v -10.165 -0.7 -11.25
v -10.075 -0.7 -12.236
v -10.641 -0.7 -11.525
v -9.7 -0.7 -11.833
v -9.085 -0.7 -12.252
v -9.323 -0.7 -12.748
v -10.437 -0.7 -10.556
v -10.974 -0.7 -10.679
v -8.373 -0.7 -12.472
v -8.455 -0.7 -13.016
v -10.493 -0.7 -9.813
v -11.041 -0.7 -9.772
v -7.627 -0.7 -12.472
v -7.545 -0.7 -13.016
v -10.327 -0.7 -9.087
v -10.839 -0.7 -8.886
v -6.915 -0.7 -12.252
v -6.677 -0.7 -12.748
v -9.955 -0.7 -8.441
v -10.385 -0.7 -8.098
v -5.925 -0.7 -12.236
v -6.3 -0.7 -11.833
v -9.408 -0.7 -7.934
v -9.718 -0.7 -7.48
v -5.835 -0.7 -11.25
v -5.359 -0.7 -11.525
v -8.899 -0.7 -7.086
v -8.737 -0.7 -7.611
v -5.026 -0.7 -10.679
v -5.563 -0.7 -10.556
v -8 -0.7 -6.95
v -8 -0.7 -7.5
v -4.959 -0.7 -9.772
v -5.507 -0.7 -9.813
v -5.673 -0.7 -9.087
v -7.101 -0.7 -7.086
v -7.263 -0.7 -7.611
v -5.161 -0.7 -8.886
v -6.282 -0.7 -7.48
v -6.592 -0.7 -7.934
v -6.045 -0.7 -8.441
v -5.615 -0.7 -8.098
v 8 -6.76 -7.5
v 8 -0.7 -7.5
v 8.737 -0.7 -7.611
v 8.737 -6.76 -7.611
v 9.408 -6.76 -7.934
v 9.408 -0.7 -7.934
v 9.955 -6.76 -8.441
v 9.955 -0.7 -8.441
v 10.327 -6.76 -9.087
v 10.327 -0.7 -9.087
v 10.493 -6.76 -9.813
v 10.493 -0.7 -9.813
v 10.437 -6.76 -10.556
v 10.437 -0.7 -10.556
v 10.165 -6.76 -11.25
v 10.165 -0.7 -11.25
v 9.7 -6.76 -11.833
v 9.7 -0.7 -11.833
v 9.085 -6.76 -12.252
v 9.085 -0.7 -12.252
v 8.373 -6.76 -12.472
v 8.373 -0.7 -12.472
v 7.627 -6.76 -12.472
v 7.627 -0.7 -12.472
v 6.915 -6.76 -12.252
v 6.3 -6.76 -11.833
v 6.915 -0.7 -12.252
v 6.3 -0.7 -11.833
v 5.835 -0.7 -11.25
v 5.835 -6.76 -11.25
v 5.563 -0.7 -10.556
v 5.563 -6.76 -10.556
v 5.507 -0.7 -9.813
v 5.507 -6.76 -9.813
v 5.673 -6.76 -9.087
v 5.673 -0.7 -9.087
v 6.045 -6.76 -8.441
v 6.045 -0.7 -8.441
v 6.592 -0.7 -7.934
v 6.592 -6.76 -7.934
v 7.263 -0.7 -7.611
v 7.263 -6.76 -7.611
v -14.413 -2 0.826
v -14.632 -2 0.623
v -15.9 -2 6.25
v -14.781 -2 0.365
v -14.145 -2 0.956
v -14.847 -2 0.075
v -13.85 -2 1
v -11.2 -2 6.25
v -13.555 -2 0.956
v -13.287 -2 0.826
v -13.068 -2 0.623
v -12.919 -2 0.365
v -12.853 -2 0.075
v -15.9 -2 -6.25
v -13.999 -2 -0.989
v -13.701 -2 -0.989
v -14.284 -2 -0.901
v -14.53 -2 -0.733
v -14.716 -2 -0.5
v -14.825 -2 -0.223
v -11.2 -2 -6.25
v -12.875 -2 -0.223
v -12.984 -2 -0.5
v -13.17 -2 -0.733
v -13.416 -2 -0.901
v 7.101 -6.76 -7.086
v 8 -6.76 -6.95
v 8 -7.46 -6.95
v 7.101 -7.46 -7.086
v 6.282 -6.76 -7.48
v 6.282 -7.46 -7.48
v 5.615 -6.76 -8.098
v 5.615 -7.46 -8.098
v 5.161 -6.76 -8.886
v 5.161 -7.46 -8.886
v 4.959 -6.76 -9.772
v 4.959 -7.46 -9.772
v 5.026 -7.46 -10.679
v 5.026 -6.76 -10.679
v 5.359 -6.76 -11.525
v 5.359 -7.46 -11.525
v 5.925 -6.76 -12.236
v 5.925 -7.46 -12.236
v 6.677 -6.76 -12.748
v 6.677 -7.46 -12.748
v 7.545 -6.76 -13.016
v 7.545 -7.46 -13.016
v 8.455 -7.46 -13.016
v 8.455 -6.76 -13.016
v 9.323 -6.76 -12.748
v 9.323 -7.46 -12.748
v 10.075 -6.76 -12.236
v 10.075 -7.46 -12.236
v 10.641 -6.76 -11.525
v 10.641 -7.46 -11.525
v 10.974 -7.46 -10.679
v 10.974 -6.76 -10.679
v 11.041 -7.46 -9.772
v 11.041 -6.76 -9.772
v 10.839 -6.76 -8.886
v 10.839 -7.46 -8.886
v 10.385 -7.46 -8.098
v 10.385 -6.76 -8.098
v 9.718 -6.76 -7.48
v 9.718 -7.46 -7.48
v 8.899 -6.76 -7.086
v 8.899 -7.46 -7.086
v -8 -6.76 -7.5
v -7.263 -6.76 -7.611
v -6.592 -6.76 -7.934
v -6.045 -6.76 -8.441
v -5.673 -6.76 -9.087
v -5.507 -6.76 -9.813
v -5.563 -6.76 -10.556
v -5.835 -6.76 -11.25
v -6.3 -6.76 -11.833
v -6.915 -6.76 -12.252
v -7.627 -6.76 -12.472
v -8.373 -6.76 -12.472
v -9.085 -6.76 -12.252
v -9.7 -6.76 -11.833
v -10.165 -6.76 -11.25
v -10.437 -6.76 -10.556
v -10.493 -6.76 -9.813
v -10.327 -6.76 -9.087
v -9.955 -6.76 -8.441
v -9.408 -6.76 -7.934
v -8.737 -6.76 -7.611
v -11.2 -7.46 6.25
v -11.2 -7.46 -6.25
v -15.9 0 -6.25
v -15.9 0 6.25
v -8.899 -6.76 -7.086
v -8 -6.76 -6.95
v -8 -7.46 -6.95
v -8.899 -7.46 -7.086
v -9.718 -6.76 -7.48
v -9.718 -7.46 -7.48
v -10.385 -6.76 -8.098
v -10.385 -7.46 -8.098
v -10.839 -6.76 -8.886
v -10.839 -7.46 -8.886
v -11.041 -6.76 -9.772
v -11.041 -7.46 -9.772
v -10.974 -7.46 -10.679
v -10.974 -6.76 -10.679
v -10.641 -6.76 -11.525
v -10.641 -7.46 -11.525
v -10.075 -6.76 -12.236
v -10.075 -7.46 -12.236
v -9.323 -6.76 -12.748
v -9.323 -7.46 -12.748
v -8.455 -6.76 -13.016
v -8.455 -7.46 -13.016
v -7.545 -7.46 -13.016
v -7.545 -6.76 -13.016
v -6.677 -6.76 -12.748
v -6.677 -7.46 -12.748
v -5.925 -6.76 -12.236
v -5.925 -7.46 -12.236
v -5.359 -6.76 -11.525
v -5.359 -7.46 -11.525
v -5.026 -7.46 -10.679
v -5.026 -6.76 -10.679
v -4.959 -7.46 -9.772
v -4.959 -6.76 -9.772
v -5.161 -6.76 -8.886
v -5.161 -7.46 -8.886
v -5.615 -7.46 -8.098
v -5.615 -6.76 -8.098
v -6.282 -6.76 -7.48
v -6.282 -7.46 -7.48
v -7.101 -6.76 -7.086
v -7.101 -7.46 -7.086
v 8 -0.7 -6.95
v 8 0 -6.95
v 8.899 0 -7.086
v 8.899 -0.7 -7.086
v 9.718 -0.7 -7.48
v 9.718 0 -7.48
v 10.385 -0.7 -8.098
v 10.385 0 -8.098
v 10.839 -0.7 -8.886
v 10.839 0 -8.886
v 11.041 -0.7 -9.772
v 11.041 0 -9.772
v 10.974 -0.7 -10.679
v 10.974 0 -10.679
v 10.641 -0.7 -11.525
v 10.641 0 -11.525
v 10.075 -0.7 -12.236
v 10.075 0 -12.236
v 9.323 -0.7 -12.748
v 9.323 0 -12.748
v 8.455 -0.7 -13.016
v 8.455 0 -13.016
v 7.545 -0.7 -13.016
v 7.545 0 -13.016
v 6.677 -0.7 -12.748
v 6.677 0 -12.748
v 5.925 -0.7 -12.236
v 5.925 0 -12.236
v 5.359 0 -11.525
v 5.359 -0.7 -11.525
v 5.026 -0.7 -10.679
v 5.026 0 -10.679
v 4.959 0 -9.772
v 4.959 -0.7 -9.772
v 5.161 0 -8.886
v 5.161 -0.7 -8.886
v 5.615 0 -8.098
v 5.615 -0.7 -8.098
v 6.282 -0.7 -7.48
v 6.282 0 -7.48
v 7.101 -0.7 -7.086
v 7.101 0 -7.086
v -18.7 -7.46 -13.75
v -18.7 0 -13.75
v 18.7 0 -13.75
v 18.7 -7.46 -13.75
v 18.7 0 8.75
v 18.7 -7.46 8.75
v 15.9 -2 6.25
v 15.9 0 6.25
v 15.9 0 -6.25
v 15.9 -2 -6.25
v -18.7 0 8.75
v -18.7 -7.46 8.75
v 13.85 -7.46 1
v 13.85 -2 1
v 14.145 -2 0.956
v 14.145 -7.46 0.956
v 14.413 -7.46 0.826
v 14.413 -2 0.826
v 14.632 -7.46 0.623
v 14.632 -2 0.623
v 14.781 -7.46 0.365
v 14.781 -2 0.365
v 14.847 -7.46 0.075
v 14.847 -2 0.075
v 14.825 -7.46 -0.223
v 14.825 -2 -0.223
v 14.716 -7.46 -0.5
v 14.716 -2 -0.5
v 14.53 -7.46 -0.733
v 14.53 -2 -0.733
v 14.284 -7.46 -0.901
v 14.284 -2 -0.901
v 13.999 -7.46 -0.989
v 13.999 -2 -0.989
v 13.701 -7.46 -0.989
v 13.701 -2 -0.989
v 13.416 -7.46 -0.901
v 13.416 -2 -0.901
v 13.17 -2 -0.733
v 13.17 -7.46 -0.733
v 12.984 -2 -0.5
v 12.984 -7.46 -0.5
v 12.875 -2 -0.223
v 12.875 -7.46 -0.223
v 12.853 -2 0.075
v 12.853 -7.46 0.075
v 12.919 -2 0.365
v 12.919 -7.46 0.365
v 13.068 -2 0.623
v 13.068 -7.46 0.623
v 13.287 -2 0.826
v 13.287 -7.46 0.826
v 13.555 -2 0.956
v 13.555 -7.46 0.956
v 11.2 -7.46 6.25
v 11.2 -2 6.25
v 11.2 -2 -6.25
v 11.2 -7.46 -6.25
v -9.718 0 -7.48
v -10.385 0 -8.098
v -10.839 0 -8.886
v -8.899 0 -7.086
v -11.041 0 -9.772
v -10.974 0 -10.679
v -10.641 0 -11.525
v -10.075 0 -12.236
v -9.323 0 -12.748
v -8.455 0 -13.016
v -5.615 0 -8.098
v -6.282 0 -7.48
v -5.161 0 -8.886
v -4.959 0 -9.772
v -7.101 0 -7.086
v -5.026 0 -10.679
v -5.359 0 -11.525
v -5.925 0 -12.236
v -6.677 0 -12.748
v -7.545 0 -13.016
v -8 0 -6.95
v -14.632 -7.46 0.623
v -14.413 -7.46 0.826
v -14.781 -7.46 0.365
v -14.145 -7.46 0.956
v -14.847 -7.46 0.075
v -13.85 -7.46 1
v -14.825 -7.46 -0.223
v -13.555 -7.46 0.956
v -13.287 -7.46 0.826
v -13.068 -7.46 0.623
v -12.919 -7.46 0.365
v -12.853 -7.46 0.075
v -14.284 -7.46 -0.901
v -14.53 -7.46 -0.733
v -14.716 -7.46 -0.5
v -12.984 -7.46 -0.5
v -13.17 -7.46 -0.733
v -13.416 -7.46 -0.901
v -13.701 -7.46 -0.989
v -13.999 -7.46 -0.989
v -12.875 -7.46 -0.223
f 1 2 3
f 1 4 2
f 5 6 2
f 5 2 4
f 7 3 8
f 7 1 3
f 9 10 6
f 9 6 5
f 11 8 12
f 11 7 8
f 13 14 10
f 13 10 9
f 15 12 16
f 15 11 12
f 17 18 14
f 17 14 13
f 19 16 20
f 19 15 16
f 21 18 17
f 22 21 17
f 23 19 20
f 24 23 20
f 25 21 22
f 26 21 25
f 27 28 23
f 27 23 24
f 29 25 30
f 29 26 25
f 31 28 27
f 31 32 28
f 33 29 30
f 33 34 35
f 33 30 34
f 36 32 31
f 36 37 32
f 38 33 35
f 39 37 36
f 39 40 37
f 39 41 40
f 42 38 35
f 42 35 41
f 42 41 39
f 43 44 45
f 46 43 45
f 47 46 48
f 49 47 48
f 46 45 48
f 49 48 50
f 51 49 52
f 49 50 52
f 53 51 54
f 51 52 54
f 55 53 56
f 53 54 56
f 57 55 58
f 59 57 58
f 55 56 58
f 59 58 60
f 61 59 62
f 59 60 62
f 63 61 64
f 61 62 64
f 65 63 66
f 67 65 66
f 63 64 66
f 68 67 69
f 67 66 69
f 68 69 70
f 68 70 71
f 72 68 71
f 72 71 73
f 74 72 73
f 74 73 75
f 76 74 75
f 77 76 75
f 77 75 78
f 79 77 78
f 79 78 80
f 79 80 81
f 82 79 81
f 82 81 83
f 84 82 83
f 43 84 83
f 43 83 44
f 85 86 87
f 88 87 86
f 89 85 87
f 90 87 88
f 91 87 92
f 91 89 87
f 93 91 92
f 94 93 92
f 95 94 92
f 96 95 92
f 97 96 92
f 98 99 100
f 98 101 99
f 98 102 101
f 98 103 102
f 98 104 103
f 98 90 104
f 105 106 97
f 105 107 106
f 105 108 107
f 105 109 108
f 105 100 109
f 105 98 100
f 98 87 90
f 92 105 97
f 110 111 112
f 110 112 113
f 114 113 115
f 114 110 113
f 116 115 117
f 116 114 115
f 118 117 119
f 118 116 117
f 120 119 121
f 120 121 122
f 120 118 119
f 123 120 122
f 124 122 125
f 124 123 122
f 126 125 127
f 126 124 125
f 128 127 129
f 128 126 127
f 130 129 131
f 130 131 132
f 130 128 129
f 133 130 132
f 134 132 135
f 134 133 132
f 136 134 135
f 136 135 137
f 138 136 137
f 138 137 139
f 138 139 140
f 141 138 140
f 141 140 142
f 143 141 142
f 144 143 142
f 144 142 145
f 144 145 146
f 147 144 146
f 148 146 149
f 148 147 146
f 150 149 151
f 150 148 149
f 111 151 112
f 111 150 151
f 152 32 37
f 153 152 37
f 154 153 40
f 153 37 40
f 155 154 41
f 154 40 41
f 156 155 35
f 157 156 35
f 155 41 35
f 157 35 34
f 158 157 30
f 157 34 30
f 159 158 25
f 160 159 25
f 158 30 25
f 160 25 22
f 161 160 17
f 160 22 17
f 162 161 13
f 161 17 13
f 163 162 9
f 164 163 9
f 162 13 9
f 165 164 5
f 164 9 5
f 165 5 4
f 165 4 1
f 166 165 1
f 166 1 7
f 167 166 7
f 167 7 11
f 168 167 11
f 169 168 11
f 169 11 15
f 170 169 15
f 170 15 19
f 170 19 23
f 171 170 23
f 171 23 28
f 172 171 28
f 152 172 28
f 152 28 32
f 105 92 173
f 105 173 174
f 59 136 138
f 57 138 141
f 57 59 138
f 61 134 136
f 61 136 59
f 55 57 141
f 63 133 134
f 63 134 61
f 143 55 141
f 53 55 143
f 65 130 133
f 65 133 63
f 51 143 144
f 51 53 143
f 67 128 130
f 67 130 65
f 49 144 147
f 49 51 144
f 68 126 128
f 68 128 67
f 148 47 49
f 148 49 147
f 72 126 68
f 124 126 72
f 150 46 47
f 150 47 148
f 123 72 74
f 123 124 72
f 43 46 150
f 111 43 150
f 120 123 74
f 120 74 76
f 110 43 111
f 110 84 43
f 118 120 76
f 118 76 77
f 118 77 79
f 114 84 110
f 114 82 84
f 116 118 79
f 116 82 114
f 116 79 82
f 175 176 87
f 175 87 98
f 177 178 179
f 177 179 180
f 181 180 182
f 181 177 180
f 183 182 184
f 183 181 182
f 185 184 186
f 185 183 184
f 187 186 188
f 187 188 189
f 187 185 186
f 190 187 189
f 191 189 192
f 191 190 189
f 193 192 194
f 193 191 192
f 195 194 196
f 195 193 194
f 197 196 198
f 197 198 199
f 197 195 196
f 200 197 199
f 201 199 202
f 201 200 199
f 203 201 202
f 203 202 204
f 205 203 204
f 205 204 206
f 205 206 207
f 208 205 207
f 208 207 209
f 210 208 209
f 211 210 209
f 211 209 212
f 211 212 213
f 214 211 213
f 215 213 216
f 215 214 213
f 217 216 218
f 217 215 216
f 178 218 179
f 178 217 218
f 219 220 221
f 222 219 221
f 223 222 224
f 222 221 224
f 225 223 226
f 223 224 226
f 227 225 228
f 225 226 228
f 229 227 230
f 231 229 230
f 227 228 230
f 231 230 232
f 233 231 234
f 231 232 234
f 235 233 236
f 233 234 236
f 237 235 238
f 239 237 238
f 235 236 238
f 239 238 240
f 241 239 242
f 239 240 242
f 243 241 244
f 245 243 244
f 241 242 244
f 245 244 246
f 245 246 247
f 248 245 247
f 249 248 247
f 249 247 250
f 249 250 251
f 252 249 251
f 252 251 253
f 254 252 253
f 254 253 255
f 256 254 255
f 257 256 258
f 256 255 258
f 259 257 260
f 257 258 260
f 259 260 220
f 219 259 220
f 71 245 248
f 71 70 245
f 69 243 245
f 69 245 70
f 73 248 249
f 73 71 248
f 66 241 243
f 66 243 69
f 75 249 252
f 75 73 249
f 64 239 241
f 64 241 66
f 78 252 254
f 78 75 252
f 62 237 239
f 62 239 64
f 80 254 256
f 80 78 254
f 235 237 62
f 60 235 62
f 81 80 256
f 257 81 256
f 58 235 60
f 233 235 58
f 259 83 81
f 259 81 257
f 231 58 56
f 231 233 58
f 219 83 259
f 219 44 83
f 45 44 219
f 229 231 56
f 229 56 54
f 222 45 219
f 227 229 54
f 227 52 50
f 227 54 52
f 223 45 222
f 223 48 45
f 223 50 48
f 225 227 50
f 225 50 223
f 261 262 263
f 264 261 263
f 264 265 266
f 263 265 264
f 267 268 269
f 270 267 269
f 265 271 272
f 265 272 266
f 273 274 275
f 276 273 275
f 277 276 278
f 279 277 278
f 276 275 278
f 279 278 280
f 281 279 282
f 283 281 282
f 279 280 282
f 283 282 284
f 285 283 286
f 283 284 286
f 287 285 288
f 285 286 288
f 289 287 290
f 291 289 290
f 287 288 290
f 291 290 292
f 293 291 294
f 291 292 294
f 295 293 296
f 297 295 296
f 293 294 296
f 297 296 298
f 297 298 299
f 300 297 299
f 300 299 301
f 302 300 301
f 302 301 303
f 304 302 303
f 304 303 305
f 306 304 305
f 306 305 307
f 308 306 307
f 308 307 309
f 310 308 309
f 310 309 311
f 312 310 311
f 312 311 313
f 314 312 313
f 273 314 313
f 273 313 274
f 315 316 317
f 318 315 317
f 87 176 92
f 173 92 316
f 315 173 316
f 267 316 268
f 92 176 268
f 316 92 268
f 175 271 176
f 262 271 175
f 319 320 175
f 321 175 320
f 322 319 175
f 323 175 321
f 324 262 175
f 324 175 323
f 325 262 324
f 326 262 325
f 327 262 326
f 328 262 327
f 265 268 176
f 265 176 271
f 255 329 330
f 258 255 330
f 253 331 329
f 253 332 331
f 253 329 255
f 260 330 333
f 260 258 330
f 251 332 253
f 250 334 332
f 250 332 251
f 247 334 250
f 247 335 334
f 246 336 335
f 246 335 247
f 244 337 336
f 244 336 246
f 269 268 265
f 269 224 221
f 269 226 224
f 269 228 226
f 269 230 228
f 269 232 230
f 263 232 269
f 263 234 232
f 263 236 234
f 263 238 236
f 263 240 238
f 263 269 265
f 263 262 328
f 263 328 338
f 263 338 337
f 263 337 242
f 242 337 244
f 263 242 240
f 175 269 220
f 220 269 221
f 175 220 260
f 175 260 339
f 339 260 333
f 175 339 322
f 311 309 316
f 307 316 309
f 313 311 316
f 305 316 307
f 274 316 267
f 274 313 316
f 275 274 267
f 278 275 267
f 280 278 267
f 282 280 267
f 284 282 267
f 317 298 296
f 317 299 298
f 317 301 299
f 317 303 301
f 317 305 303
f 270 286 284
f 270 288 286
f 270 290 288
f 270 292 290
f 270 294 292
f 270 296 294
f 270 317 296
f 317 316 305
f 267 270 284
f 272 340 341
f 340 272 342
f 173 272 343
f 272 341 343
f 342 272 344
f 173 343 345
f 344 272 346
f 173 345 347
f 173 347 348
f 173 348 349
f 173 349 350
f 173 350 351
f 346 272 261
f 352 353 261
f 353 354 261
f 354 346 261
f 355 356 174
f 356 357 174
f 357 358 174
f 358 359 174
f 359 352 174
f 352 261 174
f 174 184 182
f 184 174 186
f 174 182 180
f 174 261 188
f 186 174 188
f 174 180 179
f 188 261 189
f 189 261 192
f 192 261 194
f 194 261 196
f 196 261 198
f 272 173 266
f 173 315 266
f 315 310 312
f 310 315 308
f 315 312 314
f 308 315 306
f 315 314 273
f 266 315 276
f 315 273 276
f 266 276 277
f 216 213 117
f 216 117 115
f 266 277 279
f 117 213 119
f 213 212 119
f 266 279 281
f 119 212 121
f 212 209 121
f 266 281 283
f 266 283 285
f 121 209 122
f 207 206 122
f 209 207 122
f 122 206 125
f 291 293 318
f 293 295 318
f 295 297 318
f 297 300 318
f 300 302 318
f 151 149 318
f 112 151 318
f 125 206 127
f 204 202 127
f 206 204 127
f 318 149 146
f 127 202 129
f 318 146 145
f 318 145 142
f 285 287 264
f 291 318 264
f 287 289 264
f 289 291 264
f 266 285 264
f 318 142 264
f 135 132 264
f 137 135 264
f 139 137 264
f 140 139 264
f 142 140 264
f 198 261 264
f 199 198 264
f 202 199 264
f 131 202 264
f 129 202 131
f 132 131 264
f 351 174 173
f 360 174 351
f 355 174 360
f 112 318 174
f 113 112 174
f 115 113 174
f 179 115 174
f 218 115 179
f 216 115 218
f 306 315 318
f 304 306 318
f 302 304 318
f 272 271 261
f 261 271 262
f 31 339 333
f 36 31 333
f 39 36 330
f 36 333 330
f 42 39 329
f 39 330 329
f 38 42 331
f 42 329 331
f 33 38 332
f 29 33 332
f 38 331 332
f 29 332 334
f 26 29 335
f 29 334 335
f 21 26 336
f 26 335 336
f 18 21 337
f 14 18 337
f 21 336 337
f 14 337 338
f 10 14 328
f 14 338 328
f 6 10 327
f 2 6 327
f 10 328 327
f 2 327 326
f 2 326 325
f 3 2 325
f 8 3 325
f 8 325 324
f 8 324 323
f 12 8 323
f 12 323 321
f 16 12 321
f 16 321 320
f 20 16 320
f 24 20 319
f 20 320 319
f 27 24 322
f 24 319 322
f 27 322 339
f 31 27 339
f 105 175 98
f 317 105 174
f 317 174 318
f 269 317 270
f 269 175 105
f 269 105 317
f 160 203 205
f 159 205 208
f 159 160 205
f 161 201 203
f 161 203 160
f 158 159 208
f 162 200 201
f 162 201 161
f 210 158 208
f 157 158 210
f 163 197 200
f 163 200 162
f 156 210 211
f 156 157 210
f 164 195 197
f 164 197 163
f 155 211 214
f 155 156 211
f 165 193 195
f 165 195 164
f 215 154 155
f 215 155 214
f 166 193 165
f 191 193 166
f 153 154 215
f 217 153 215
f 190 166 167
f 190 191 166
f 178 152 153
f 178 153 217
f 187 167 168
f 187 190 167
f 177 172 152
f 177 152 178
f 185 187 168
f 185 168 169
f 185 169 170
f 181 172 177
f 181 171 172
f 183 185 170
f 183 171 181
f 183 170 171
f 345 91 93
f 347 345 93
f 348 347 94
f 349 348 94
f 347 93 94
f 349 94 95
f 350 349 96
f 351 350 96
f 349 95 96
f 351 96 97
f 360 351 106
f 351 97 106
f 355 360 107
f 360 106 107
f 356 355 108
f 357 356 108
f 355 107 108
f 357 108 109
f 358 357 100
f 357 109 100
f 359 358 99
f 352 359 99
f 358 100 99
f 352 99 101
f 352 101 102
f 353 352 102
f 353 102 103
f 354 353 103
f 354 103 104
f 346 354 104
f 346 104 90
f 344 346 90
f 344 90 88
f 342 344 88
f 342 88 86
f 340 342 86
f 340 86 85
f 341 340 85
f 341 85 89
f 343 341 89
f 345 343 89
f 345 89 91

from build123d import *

# Parameters (mm, degrees)
SKETCH1_W           = 37.4
SKETCH1_H           = 22.5
SKETCH1_R           = 1
SKETCH1_W_2         = 22.4
SKETCH1_H_2         = 12.5
BOSS_EXTRUDE1_DEPTH = 7.46
SKETCH2_W           = 31.8
SKETCH2_H           = 12.5
CUT_EXTRUDE1_DEPTH  = 2
SKETCH3_R           = 2.5
CUT_EXTRUDE2_DEPTH  = 25.380404016
SKETCH4_R           = 3.05
CUT_EXTRUDE3_DEPTH  = 0.7
CUT_EXTRUDE4_START  = -0.7
SKETCH5_R           = 3.05
CUT_EXTRUDE4_DEPTH  = 0.7


with BuildPart() as part:
    # Sketch1 → Boss-Extrude1 (new body)
    with BuildSketch(Plane(origin=(0, 0, 0), x_dir=(1, 0, 0), z_dir=(0, 1, 0))):
        with Locations((0, 2.5)):
            Rectangle(SKETCH1_W, SKETCH1_H)
        with Locations(Location((13.85, 0, 0), (0, 0, 270))):
            Circle(SKETCH1_R, mode=Mode.SUBTRACT)
        with Locations(Location((-13.85, 0, 0), (0, 0, 270))):
            Circle(SKETCH1_R, mode=Mode.SUBTRACT)
        Rectangle(SKETCH1_W_2, SKETCH1_H_2, mode=Mode.SUBTRACT)
    extrude(amount=-BOSS_EXTRUDE1_DEPTH)

    # Sketch2 → Cut-Extrude1 (cut)
    with BuildSketch(Plane(origin=(0, 0, 0), x_dir=(1, 0, 0), z_dir=(0, 1, 0))):
        Rectangle(SKETCH2_W, SKETCH2_H)
    extrude(amount=-CUT_EXTRUDE1_DEPTH, mode=Mode.SUBTRACT)

    # Sketch3 → Cut-Extrude2 (cut, through all)
    with BuildSketch(Plane(origin=(0, 0, 0), x_dir=(1, 0, 0), z_dir=(0, 1, 0))):
        with Locations(Location((8, 10, 0), (0, 0, 270))):
            Circle(SKETCH3_R)
        with Locations(Location((-8, 10, 0), (0, 0, 270))):
            Circle(SKETCH3_R)
    extrude(amount=-CUT_EXTRUDE2_DEPTH, mode=Mode.SUBTRACT)

    # Sketch4 → Cut-Extrude3 (cut)
    with BuildSketch(Plane(origin=(0, 0, 0), x_dir=(1, 0, 0), z_dir=(0, 1, 0))):
        with Locations(Location((-8, 10, 0), (0, 0, 270))):
            Circle(SKETCH4_R)
        with Locations(Location((8, 10, 0), (0, 0, 270))):
            Circle(SKETCH4_R)
    extrude(amount=-CUT_EXTRUDE3_DEPTH, mode=Mode.SUBTRACT)

    # Sketch5 → Cut-Extrude4 (cut)
    with BuildSketch(Plane(origin=(0, -7.46, 0), x_dir=(-1, 0, 0), z_dir=(0, -1, 0)).offset(CUT_EXTRUDE4_START)):
        with Locations(Location((-8, 10, 0), (0, 0, 270))):
            Circle(SKETCH5_R)
        with Locations(Location((8, 10, 0), (0, 0, 270))):
            Circle(SKETCH5_R)
    extrude(amount=CUT_EXTRUDE4_DEPTH, mode=Mode.SUBTRACT)


solid = part.part
